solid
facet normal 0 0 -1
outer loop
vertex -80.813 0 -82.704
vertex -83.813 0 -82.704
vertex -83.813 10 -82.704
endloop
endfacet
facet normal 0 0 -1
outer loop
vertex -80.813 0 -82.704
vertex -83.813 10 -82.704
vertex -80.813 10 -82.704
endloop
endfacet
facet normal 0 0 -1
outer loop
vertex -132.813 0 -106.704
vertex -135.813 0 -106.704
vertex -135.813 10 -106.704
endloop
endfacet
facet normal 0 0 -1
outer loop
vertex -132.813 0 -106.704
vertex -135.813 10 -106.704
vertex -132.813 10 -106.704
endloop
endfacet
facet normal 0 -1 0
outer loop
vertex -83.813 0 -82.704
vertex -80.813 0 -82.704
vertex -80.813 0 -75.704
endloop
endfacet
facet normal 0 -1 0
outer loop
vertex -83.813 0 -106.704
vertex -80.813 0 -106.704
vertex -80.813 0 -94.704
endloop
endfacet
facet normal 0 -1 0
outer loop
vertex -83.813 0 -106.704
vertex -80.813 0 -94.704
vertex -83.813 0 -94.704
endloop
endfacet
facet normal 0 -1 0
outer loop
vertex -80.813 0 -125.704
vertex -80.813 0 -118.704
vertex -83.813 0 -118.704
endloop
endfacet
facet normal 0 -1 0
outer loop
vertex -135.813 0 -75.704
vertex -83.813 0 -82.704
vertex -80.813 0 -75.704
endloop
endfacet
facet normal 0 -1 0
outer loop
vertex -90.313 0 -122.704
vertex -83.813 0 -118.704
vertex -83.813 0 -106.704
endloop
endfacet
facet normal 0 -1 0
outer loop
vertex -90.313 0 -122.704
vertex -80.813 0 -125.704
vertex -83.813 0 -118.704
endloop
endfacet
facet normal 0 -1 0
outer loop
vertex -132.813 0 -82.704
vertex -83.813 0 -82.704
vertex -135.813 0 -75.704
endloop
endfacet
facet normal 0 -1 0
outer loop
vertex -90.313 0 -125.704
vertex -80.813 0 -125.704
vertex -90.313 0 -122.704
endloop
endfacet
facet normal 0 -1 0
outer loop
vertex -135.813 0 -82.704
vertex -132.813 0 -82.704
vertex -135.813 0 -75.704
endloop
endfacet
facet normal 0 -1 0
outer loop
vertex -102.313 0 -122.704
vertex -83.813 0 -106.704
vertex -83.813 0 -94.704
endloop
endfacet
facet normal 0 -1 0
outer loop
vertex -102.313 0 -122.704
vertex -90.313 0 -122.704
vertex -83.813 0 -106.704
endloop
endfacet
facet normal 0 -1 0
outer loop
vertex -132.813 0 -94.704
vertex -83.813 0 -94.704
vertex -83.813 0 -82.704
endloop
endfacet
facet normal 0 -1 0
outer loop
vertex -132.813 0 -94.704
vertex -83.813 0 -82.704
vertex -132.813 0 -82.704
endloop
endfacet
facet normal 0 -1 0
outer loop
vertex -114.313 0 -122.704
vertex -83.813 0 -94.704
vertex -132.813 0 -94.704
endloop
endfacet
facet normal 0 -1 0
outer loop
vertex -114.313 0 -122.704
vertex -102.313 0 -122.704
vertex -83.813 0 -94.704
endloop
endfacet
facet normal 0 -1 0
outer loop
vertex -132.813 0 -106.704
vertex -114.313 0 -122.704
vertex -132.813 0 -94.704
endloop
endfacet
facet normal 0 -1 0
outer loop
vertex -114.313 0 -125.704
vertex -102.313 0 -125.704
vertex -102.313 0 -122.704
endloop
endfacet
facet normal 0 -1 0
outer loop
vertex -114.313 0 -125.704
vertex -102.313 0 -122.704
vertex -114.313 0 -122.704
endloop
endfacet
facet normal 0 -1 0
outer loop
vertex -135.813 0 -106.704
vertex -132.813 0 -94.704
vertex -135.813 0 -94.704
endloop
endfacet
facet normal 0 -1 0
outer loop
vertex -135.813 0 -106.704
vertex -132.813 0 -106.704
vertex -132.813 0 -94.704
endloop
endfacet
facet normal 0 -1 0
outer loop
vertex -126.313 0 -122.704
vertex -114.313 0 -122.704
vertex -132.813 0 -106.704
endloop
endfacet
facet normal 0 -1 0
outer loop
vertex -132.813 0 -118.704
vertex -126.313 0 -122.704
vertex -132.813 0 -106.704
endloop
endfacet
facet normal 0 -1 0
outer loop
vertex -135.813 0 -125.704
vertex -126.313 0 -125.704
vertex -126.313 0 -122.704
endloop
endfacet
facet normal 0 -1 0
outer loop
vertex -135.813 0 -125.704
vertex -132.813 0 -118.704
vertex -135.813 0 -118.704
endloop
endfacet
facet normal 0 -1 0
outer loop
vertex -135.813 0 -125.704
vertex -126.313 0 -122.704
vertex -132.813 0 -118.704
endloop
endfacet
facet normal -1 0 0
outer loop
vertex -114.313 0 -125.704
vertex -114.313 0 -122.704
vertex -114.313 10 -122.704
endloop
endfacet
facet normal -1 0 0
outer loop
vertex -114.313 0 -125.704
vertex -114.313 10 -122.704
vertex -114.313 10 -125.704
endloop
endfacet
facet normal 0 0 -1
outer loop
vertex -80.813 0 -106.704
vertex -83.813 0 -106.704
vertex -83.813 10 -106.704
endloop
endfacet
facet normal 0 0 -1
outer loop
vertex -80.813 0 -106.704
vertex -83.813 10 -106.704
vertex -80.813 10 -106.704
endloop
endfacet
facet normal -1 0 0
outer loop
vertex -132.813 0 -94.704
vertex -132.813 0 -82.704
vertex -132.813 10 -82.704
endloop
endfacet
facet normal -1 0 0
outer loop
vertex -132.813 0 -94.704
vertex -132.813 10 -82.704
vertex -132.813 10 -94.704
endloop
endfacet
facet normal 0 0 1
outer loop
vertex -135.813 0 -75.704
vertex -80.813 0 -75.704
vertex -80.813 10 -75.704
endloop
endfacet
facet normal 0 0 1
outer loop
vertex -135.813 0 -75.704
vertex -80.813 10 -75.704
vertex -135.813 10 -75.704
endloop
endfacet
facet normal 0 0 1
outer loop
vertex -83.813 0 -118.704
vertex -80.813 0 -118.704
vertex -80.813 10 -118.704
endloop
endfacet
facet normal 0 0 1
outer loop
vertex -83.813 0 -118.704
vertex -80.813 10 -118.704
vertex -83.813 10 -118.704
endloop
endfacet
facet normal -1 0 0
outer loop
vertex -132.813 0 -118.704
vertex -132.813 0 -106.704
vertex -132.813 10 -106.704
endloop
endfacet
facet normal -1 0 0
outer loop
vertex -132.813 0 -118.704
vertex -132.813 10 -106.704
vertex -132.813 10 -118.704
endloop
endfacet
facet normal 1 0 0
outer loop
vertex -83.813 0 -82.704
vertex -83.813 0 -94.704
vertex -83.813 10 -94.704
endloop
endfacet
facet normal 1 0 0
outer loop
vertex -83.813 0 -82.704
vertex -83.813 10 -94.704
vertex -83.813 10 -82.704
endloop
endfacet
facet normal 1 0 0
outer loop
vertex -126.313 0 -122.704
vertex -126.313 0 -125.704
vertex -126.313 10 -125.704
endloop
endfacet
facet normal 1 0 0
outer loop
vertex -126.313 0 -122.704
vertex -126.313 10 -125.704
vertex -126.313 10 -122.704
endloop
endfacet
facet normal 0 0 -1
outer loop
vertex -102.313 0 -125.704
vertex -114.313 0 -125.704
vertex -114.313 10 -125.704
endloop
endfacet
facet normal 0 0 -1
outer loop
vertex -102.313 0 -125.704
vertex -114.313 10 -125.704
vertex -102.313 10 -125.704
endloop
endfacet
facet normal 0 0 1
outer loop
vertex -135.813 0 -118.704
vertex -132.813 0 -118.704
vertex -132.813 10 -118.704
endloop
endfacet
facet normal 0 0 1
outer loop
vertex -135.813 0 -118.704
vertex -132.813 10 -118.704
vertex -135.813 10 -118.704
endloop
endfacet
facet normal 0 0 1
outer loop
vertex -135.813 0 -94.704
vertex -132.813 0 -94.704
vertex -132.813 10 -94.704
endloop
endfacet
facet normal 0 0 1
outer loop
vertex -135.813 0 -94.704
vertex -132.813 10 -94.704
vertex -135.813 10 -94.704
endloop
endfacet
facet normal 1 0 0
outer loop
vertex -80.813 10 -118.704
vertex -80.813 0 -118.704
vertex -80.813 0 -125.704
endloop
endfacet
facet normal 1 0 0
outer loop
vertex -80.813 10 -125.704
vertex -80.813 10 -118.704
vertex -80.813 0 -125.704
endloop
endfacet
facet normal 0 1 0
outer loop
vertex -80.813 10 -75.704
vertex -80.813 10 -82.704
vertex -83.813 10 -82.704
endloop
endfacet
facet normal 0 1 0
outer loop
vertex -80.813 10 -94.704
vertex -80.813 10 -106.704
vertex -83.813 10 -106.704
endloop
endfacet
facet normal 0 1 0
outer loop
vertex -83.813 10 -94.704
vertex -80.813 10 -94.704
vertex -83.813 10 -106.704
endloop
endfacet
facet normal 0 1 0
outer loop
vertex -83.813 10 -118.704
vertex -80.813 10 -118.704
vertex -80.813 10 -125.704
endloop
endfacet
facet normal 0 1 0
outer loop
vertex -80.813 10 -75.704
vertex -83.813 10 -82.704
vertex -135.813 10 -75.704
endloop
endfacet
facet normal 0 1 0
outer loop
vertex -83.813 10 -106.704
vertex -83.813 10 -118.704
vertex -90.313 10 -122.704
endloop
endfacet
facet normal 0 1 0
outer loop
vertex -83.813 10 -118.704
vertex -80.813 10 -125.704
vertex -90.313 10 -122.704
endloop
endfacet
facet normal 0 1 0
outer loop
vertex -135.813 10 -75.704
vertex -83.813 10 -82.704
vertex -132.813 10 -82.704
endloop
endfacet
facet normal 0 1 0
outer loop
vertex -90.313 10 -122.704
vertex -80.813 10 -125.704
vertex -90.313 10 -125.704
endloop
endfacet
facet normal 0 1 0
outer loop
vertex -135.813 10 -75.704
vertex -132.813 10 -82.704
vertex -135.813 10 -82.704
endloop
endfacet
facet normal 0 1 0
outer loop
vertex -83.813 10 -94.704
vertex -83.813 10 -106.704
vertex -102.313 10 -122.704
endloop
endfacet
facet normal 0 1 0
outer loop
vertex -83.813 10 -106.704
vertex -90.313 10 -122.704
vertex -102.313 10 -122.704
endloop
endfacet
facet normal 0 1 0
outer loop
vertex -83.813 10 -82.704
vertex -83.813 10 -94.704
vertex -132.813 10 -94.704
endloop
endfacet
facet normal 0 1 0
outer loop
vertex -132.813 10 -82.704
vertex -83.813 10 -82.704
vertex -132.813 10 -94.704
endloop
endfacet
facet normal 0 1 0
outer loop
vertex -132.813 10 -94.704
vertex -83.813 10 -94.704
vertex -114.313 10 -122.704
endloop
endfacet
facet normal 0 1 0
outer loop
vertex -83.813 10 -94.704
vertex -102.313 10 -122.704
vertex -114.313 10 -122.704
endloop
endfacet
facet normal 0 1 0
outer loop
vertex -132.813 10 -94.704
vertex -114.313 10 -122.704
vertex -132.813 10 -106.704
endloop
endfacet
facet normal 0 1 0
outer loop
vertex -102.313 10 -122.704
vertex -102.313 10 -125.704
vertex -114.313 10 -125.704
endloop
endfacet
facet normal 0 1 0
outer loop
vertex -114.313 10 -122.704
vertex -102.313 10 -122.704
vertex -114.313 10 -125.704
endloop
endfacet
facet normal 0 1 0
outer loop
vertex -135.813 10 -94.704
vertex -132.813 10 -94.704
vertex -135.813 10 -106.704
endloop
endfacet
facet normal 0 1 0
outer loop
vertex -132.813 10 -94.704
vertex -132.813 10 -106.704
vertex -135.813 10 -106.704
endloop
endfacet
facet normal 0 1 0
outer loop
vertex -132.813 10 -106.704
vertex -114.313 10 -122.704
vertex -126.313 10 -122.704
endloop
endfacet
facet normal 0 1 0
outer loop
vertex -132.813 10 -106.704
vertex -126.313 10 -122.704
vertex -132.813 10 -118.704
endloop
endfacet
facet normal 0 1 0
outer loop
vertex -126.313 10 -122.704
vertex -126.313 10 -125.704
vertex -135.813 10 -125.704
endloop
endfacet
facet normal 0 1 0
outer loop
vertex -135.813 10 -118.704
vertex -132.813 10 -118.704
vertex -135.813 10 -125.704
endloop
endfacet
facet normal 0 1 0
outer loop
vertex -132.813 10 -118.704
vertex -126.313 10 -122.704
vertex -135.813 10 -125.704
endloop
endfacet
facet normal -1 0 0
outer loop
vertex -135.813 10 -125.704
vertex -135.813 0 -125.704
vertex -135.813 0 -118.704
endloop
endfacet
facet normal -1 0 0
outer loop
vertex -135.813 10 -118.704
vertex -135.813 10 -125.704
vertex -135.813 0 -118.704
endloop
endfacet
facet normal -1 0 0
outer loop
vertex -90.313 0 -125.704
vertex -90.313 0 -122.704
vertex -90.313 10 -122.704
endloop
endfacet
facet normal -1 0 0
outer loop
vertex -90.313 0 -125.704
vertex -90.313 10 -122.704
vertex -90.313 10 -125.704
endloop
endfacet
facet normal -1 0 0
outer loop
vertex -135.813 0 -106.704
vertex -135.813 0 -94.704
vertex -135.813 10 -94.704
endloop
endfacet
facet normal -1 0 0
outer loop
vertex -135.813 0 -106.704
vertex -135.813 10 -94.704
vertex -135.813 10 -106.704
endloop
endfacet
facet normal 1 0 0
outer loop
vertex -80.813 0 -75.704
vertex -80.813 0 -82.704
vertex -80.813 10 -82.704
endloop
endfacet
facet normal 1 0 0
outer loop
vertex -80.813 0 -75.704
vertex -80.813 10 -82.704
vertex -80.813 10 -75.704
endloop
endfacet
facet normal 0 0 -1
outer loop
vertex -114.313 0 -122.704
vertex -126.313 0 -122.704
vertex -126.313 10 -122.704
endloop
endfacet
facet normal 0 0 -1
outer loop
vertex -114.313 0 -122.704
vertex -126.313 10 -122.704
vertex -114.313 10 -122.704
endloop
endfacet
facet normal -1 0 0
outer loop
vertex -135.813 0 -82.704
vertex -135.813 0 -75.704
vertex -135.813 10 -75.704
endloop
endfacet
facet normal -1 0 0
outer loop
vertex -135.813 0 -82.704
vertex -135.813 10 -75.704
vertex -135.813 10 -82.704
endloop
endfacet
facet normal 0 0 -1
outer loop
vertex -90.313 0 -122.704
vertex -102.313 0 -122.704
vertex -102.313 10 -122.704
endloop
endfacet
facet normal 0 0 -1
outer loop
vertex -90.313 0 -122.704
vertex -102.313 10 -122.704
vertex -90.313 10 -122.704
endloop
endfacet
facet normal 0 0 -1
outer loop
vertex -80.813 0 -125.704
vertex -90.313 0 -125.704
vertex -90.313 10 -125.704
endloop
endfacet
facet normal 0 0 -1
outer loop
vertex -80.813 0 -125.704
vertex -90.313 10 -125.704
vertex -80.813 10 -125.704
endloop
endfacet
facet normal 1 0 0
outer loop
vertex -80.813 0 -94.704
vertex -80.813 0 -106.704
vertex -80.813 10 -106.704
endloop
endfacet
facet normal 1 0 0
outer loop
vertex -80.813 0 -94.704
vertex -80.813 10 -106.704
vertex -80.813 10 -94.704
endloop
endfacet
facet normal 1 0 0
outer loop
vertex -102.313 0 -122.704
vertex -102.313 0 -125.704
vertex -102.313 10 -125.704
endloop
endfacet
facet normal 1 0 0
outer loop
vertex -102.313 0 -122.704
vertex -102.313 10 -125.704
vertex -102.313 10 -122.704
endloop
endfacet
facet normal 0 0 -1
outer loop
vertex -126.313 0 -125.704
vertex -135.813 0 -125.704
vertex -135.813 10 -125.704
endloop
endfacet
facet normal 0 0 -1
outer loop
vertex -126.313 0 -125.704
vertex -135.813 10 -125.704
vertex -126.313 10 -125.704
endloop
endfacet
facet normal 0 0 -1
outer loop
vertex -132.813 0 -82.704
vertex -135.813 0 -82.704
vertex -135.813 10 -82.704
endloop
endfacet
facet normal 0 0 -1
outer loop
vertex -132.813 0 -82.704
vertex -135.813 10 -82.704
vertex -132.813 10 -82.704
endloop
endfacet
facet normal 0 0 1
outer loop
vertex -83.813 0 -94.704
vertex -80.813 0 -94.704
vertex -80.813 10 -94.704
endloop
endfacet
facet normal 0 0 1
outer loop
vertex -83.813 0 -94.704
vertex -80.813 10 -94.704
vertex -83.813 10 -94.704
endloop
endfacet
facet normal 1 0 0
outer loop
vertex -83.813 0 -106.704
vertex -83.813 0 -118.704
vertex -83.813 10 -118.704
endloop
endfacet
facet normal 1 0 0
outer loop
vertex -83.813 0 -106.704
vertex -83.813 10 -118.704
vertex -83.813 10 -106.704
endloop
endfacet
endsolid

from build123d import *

# Parameters (mm, degrees)
BOSS_EXTRUDE1_DEPTH = 10


with BuildPart() as part:
    # Sketch1 → Boss-Extrude1 (new body)
    with BuildSketch(Plane(origin=(0, 0, 0), x_dir=(1, 0, 0), z_dir=(0, 1, 0))):
        Polygon((-135.812908411, 125.703692436), (-126.31291151, 125.703692436), (-126.31291151, 122.703686357), (-114.312909544, 122.703686357), (-114.312909544, 125.703692436), (-102.312915027, 125.703692436), (-102.312915027, 122.703686357), (-90.31291306, 122.703686357), (-90.31291306, 125.703692436), (-80.812908709, 125.703692436), (-80.812908709, 122.703686357), (-80.812908709, 118.703693151), (-83.812914789, 118.703693151), (-83.812914789, 106.703691185), (-80.812908709, 106.703691185), (-80.812908709, 94.703689218), (-83.812914789, 94.703689218), (-83.812914789, 82.703687251), (-80.812908709, 82.703687251), (-80.812908709, 75.703687966), (-135.812908411, 75.703687966), (-135.812908411, 82.703687251), (-132.812917233, 82.703687251), (-132.812917233, 94.703689218), (-135.812908411, 94.703689218), (-135.812908411, 106.703691185), (-132.812917233, 106.703691185), (-132.812917233, 118.703693151), (-135.812908411, 118.703693151), (-135.812908411, 122.703686357), align=None)
    extrude(amount=BOSS_EXTRUDE1_DEPTH)


solid = part.part
